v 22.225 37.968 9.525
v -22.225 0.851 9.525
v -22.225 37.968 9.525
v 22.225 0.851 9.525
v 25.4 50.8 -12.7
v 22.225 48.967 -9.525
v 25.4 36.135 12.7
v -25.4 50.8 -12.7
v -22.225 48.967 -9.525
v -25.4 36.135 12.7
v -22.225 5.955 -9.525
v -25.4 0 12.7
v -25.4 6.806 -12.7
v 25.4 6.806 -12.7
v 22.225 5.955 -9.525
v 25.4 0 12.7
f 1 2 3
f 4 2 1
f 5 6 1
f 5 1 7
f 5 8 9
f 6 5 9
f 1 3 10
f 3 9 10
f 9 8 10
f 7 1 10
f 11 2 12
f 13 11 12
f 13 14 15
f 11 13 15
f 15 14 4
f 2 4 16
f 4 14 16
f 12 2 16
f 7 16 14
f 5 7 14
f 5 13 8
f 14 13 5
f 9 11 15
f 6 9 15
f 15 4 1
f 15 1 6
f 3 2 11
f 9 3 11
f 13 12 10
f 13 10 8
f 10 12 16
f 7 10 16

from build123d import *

# Parameters (mm, degrees)
SKETCH1_W           = 50.8
SKETCH1_H           = 25.4
SKETCH1_W_2         = 44.45
SKETCH1_H_2         = 19.05
BOSS_EXTRUDE1_DEPTH = 50.8
CUT_EXTRUDE1_DEPTH  = 73.955945611
CUT_EXTRUDE2_DEPTH  = 73.955945611


with BuildPart() as part:
    # Sketch1 → Boss-Extrude1 (new body)
    with BuildSketch(Plane(origin=(0, 0, 0), x_dir=(1, 0, 0), z_dir=(0, 1, 0))):
        Rectangle(SKETCH1_W, SKETCH1_H)
        Rectangle(SKETCH1_W_2, SKETCH1_H_2, mode=Mode.SUBTRACT)
    extrude(amount=BOSS_EXTRUDE1_DEPTH)

    # Sketch2 → Cut-Extrude1 (cut, through all)
    with BuildSketch(Plane.ZY.offset(25.4)):
        Polygon((12.7, 50.8), (-12.7, 50.8), (12.7, 36.135303163), align=None)
    extrude(amount=-CUT_EXTRUDE1_DEPTH, mode=Mode.SUBTRACT)

    # Sketch3 → Cut-Extrude2 (cut, through all)
    with BuildSketch(Plane(origin=(25.4, 0, 0), x_dir=(0, 0, -1), z_dir=(1, 0, 0))):
        Polygon((12.7, 6.805909488), (-12.7, 0), (12.7, 0), align=None)
    extrude(amount=-CUT_EXTRUDE2_DEPTH, mode=Mode.SUBTRACT)


solid = part.part
